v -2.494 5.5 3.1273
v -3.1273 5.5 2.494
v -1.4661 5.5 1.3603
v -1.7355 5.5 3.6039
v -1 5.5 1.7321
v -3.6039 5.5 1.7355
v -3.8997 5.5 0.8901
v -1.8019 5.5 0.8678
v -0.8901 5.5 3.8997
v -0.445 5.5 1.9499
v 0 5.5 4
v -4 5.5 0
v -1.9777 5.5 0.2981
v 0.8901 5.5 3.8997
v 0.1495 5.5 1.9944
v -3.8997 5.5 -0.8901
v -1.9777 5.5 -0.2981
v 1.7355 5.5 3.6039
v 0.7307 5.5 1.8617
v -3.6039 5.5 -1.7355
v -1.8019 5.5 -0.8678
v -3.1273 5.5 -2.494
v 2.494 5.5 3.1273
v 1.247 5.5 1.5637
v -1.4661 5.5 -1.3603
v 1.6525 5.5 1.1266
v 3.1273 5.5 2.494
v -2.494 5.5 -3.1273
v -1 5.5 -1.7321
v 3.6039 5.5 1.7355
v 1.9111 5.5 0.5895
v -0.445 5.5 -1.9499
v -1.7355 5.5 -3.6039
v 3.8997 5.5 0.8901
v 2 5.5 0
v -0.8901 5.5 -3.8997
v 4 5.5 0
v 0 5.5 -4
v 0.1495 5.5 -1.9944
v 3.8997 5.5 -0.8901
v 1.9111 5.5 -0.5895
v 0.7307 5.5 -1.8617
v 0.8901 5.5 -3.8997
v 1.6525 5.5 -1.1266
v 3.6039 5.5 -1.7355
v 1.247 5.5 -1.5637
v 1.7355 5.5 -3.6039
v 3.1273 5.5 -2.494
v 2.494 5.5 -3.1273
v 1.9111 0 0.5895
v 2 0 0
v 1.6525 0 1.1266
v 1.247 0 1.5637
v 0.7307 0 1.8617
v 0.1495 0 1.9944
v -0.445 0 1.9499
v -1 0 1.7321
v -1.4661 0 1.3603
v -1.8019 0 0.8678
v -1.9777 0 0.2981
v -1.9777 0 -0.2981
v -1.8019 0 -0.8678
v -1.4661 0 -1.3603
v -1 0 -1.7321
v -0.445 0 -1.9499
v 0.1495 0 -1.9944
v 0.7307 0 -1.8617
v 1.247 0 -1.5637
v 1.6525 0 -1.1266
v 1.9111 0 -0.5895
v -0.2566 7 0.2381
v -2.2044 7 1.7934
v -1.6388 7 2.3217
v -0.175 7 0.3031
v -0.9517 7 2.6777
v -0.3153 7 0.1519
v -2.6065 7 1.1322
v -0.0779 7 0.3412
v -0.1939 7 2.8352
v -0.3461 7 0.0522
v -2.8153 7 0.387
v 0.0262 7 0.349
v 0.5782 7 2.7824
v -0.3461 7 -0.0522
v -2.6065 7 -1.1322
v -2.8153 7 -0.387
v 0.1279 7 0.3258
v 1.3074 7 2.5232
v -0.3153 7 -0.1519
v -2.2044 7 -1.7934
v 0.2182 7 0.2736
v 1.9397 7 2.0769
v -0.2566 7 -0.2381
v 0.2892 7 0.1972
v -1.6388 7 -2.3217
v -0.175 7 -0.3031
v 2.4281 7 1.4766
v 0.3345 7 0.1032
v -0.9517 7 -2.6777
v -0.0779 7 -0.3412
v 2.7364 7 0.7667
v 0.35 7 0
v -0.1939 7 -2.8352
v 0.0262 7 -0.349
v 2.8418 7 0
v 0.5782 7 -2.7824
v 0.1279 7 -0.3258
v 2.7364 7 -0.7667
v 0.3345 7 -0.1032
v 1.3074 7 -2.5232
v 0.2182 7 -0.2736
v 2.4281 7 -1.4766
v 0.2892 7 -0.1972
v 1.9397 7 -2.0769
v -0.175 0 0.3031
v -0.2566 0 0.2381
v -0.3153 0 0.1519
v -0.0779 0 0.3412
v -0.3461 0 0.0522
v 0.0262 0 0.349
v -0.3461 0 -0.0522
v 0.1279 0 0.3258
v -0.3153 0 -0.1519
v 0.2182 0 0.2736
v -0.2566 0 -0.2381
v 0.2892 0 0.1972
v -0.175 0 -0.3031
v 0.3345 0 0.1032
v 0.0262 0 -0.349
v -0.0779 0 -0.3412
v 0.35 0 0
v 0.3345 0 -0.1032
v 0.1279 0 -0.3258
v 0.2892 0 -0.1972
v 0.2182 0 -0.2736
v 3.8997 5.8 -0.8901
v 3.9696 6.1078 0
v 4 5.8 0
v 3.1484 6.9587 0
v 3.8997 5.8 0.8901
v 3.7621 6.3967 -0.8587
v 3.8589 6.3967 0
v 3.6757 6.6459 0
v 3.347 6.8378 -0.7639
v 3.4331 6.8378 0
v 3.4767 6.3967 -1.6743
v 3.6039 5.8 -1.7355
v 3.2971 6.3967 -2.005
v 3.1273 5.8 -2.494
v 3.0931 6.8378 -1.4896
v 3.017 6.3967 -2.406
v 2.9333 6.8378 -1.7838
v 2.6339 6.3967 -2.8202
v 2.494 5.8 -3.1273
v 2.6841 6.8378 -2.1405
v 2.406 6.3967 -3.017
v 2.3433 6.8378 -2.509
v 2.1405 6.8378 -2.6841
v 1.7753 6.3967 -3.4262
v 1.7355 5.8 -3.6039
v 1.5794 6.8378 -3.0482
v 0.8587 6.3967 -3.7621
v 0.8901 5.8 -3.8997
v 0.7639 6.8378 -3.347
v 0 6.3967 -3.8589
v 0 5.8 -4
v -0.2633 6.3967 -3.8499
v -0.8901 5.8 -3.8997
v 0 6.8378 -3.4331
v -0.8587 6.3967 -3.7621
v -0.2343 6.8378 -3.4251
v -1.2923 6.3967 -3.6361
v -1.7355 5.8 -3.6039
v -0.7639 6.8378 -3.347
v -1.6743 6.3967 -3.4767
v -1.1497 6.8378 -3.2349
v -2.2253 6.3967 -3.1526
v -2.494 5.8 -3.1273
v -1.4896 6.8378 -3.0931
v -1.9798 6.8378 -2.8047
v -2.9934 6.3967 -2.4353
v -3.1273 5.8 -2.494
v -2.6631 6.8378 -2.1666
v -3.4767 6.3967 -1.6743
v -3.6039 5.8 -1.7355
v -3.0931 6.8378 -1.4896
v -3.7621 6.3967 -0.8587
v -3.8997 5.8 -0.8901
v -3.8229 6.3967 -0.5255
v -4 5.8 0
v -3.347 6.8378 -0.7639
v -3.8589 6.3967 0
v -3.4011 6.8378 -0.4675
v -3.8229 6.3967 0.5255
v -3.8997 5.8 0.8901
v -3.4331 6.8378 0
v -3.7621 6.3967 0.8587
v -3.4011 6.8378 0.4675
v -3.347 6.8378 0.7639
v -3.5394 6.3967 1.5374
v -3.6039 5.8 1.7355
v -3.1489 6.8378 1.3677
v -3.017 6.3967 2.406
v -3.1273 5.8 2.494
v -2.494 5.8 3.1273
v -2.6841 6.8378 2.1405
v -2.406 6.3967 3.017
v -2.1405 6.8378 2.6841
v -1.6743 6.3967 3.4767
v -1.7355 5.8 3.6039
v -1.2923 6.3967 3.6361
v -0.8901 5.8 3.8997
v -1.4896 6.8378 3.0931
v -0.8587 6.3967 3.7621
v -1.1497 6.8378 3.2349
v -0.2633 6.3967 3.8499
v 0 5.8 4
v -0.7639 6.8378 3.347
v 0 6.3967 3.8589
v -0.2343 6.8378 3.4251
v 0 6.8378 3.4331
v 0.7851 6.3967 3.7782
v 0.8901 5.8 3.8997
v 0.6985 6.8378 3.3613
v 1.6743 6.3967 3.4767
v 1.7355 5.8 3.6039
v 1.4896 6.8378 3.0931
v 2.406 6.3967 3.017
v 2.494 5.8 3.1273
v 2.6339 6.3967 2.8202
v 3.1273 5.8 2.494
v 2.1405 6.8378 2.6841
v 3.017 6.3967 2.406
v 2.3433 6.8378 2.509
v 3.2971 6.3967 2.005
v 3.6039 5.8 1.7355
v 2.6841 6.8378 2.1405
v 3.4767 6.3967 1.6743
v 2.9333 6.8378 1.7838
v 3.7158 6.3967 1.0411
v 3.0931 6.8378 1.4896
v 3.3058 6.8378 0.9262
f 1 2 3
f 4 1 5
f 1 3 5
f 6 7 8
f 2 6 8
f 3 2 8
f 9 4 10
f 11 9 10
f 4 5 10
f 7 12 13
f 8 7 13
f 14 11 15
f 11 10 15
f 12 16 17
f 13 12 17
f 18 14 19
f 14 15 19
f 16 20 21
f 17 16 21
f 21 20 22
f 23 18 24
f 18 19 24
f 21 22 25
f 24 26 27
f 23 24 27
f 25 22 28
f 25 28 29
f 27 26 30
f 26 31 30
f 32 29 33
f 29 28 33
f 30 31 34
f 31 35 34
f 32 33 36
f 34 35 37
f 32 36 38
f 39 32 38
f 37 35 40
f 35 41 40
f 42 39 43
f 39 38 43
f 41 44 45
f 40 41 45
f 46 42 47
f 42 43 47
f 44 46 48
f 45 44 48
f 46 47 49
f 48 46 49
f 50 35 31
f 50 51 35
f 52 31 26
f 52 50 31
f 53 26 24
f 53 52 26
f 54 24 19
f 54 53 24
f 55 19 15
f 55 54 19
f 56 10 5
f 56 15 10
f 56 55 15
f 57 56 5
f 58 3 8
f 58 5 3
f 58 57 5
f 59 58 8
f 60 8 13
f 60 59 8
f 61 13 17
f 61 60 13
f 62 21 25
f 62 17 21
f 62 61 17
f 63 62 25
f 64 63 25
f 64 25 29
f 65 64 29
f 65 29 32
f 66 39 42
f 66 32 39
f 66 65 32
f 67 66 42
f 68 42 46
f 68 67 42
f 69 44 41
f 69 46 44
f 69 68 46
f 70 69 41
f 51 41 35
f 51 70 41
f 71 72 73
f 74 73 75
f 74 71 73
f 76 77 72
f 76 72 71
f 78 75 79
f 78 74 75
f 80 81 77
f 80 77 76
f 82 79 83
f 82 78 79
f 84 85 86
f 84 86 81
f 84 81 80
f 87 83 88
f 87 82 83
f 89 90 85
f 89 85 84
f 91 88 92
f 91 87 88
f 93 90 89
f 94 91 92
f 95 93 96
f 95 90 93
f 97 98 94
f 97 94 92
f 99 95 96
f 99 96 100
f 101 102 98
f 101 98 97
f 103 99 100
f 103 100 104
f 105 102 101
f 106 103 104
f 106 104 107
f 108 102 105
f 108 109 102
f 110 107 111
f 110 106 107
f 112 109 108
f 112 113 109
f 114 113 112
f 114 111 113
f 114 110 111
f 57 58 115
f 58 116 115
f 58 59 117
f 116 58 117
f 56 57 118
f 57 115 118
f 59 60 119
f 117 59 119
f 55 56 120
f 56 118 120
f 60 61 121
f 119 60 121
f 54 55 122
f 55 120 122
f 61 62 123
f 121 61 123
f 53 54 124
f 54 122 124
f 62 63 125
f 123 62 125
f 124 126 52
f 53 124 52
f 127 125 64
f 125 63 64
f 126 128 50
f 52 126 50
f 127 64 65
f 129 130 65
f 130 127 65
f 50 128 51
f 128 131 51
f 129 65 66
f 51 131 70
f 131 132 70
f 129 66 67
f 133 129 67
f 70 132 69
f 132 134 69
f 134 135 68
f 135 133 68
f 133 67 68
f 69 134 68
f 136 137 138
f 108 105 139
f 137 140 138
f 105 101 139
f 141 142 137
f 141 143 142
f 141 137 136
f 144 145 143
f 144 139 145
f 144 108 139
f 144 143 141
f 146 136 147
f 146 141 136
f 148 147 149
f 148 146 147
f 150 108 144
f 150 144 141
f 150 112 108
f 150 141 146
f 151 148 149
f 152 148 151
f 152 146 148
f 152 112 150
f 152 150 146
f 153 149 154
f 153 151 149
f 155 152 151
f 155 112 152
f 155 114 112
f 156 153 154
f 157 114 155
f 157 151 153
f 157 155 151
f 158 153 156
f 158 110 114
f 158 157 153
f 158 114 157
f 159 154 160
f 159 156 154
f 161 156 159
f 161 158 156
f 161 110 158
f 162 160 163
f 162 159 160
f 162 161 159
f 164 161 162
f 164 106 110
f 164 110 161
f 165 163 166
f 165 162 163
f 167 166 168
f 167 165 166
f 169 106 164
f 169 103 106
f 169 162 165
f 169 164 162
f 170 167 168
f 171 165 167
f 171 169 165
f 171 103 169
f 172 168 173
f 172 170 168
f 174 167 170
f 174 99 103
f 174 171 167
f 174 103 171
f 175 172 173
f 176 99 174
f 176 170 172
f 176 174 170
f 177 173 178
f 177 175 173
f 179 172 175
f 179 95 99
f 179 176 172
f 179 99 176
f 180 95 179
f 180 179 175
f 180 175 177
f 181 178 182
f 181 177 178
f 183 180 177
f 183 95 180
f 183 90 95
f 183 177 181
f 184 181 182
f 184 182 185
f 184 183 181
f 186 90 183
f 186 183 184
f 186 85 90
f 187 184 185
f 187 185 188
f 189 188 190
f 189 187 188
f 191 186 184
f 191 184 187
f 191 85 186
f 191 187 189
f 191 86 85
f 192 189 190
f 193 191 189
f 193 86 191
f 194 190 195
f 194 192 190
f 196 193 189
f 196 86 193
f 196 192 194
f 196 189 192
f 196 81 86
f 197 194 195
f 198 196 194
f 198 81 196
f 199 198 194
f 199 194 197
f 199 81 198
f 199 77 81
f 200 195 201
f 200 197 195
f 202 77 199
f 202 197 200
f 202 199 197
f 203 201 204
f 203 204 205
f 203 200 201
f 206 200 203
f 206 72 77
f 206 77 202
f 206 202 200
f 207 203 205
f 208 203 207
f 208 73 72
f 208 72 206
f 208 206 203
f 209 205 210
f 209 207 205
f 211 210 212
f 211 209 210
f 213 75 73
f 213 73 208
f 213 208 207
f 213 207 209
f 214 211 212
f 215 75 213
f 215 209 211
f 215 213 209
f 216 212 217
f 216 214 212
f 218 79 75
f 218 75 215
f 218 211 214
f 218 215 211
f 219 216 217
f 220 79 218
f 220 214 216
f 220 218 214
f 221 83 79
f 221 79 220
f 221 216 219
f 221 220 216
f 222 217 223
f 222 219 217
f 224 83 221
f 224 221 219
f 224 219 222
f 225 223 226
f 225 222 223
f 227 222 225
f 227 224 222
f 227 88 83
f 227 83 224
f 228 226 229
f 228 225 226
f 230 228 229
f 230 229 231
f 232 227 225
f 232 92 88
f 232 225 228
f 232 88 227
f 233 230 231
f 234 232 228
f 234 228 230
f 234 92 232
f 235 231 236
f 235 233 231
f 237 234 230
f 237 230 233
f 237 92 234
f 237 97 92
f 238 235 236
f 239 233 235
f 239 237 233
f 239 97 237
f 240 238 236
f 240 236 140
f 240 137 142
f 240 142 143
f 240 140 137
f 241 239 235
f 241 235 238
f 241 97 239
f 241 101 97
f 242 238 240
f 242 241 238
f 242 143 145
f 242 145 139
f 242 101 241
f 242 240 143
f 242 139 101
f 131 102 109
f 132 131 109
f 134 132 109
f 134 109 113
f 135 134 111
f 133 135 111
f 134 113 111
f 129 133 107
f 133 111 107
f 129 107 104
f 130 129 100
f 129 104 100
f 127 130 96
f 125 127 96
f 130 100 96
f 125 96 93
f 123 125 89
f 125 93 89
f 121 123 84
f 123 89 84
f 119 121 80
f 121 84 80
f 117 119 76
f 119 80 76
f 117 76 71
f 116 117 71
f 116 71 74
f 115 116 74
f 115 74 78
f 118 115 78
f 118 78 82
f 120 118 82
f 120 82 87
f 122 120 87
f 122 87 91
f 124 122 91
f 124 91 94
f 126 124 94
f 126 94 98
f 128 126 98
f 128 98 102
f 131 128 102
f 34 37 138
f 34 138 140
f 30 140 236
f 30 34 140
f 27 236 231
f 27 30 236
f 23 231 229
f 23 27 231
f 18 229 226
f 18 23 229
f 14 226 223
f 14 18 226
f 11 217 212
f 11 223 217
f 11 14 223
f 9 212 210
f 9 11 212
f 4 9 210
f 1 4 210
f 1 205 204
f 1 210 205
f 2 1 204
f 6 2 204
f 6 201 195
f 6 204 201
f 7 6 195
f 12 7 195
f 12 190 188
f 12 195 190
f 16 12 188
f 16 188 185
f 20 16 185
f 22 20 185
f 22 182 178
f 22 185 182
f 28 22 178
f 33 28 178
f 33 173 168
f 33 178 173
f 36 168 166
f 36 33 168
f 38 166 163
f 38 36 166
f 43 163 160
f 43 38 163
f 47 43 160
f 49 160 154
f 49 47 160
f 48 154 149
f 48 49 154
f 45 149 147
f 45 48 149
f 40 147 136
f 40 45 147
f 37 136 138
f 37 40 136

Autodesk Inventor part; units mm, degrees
ref_plane "YZ Plane" through (0, 0, 0) normal (1, 0, 0) x (0, 1, 0)
ref_plane "XZ Plane" through (0, 0, 0) normal (0, 1, 0) x (-1, 0, 0)
ref_plane "XY Plane" through (0, 0, 0) normal (0, 0, 1) x (1, 0, 0)
sketch "Sketch1" plane through (0, 0, 0) normal (0, 0, 1) x (1, 0, 0)
  line L0 (0.35, 0) -> (0.35, 7)
  line L1 (0.35, 7) -> (2.8418, 7)
  arc A0 (4, 5.8) -> (2.8418, 7) centre (2.8418, 5.8411) ccw
  line L2 (4, 5.8) -> (4, 5.5)
  line L3 (4, 5.5) -> (2, 5.5)
  line L4 (2, 5.5) -> (2, 0)
  line L5 (2, 0) -> (0.35, 0)
  line L6 (0, 0) -> (0, 7) construction
  dimension "d0" = 4
  dimension "d1" = 0.7
  dimension "d2" = 7
  dimension "d3" = 1.5
  dimension "d4" = 8
  dimension "d5" = 0.3
revolve "Revolution1" add sketch "Sketch1" angle 360 about axis through (0, 0, 0) along (0, 1, 0)
properties part number "remache"
